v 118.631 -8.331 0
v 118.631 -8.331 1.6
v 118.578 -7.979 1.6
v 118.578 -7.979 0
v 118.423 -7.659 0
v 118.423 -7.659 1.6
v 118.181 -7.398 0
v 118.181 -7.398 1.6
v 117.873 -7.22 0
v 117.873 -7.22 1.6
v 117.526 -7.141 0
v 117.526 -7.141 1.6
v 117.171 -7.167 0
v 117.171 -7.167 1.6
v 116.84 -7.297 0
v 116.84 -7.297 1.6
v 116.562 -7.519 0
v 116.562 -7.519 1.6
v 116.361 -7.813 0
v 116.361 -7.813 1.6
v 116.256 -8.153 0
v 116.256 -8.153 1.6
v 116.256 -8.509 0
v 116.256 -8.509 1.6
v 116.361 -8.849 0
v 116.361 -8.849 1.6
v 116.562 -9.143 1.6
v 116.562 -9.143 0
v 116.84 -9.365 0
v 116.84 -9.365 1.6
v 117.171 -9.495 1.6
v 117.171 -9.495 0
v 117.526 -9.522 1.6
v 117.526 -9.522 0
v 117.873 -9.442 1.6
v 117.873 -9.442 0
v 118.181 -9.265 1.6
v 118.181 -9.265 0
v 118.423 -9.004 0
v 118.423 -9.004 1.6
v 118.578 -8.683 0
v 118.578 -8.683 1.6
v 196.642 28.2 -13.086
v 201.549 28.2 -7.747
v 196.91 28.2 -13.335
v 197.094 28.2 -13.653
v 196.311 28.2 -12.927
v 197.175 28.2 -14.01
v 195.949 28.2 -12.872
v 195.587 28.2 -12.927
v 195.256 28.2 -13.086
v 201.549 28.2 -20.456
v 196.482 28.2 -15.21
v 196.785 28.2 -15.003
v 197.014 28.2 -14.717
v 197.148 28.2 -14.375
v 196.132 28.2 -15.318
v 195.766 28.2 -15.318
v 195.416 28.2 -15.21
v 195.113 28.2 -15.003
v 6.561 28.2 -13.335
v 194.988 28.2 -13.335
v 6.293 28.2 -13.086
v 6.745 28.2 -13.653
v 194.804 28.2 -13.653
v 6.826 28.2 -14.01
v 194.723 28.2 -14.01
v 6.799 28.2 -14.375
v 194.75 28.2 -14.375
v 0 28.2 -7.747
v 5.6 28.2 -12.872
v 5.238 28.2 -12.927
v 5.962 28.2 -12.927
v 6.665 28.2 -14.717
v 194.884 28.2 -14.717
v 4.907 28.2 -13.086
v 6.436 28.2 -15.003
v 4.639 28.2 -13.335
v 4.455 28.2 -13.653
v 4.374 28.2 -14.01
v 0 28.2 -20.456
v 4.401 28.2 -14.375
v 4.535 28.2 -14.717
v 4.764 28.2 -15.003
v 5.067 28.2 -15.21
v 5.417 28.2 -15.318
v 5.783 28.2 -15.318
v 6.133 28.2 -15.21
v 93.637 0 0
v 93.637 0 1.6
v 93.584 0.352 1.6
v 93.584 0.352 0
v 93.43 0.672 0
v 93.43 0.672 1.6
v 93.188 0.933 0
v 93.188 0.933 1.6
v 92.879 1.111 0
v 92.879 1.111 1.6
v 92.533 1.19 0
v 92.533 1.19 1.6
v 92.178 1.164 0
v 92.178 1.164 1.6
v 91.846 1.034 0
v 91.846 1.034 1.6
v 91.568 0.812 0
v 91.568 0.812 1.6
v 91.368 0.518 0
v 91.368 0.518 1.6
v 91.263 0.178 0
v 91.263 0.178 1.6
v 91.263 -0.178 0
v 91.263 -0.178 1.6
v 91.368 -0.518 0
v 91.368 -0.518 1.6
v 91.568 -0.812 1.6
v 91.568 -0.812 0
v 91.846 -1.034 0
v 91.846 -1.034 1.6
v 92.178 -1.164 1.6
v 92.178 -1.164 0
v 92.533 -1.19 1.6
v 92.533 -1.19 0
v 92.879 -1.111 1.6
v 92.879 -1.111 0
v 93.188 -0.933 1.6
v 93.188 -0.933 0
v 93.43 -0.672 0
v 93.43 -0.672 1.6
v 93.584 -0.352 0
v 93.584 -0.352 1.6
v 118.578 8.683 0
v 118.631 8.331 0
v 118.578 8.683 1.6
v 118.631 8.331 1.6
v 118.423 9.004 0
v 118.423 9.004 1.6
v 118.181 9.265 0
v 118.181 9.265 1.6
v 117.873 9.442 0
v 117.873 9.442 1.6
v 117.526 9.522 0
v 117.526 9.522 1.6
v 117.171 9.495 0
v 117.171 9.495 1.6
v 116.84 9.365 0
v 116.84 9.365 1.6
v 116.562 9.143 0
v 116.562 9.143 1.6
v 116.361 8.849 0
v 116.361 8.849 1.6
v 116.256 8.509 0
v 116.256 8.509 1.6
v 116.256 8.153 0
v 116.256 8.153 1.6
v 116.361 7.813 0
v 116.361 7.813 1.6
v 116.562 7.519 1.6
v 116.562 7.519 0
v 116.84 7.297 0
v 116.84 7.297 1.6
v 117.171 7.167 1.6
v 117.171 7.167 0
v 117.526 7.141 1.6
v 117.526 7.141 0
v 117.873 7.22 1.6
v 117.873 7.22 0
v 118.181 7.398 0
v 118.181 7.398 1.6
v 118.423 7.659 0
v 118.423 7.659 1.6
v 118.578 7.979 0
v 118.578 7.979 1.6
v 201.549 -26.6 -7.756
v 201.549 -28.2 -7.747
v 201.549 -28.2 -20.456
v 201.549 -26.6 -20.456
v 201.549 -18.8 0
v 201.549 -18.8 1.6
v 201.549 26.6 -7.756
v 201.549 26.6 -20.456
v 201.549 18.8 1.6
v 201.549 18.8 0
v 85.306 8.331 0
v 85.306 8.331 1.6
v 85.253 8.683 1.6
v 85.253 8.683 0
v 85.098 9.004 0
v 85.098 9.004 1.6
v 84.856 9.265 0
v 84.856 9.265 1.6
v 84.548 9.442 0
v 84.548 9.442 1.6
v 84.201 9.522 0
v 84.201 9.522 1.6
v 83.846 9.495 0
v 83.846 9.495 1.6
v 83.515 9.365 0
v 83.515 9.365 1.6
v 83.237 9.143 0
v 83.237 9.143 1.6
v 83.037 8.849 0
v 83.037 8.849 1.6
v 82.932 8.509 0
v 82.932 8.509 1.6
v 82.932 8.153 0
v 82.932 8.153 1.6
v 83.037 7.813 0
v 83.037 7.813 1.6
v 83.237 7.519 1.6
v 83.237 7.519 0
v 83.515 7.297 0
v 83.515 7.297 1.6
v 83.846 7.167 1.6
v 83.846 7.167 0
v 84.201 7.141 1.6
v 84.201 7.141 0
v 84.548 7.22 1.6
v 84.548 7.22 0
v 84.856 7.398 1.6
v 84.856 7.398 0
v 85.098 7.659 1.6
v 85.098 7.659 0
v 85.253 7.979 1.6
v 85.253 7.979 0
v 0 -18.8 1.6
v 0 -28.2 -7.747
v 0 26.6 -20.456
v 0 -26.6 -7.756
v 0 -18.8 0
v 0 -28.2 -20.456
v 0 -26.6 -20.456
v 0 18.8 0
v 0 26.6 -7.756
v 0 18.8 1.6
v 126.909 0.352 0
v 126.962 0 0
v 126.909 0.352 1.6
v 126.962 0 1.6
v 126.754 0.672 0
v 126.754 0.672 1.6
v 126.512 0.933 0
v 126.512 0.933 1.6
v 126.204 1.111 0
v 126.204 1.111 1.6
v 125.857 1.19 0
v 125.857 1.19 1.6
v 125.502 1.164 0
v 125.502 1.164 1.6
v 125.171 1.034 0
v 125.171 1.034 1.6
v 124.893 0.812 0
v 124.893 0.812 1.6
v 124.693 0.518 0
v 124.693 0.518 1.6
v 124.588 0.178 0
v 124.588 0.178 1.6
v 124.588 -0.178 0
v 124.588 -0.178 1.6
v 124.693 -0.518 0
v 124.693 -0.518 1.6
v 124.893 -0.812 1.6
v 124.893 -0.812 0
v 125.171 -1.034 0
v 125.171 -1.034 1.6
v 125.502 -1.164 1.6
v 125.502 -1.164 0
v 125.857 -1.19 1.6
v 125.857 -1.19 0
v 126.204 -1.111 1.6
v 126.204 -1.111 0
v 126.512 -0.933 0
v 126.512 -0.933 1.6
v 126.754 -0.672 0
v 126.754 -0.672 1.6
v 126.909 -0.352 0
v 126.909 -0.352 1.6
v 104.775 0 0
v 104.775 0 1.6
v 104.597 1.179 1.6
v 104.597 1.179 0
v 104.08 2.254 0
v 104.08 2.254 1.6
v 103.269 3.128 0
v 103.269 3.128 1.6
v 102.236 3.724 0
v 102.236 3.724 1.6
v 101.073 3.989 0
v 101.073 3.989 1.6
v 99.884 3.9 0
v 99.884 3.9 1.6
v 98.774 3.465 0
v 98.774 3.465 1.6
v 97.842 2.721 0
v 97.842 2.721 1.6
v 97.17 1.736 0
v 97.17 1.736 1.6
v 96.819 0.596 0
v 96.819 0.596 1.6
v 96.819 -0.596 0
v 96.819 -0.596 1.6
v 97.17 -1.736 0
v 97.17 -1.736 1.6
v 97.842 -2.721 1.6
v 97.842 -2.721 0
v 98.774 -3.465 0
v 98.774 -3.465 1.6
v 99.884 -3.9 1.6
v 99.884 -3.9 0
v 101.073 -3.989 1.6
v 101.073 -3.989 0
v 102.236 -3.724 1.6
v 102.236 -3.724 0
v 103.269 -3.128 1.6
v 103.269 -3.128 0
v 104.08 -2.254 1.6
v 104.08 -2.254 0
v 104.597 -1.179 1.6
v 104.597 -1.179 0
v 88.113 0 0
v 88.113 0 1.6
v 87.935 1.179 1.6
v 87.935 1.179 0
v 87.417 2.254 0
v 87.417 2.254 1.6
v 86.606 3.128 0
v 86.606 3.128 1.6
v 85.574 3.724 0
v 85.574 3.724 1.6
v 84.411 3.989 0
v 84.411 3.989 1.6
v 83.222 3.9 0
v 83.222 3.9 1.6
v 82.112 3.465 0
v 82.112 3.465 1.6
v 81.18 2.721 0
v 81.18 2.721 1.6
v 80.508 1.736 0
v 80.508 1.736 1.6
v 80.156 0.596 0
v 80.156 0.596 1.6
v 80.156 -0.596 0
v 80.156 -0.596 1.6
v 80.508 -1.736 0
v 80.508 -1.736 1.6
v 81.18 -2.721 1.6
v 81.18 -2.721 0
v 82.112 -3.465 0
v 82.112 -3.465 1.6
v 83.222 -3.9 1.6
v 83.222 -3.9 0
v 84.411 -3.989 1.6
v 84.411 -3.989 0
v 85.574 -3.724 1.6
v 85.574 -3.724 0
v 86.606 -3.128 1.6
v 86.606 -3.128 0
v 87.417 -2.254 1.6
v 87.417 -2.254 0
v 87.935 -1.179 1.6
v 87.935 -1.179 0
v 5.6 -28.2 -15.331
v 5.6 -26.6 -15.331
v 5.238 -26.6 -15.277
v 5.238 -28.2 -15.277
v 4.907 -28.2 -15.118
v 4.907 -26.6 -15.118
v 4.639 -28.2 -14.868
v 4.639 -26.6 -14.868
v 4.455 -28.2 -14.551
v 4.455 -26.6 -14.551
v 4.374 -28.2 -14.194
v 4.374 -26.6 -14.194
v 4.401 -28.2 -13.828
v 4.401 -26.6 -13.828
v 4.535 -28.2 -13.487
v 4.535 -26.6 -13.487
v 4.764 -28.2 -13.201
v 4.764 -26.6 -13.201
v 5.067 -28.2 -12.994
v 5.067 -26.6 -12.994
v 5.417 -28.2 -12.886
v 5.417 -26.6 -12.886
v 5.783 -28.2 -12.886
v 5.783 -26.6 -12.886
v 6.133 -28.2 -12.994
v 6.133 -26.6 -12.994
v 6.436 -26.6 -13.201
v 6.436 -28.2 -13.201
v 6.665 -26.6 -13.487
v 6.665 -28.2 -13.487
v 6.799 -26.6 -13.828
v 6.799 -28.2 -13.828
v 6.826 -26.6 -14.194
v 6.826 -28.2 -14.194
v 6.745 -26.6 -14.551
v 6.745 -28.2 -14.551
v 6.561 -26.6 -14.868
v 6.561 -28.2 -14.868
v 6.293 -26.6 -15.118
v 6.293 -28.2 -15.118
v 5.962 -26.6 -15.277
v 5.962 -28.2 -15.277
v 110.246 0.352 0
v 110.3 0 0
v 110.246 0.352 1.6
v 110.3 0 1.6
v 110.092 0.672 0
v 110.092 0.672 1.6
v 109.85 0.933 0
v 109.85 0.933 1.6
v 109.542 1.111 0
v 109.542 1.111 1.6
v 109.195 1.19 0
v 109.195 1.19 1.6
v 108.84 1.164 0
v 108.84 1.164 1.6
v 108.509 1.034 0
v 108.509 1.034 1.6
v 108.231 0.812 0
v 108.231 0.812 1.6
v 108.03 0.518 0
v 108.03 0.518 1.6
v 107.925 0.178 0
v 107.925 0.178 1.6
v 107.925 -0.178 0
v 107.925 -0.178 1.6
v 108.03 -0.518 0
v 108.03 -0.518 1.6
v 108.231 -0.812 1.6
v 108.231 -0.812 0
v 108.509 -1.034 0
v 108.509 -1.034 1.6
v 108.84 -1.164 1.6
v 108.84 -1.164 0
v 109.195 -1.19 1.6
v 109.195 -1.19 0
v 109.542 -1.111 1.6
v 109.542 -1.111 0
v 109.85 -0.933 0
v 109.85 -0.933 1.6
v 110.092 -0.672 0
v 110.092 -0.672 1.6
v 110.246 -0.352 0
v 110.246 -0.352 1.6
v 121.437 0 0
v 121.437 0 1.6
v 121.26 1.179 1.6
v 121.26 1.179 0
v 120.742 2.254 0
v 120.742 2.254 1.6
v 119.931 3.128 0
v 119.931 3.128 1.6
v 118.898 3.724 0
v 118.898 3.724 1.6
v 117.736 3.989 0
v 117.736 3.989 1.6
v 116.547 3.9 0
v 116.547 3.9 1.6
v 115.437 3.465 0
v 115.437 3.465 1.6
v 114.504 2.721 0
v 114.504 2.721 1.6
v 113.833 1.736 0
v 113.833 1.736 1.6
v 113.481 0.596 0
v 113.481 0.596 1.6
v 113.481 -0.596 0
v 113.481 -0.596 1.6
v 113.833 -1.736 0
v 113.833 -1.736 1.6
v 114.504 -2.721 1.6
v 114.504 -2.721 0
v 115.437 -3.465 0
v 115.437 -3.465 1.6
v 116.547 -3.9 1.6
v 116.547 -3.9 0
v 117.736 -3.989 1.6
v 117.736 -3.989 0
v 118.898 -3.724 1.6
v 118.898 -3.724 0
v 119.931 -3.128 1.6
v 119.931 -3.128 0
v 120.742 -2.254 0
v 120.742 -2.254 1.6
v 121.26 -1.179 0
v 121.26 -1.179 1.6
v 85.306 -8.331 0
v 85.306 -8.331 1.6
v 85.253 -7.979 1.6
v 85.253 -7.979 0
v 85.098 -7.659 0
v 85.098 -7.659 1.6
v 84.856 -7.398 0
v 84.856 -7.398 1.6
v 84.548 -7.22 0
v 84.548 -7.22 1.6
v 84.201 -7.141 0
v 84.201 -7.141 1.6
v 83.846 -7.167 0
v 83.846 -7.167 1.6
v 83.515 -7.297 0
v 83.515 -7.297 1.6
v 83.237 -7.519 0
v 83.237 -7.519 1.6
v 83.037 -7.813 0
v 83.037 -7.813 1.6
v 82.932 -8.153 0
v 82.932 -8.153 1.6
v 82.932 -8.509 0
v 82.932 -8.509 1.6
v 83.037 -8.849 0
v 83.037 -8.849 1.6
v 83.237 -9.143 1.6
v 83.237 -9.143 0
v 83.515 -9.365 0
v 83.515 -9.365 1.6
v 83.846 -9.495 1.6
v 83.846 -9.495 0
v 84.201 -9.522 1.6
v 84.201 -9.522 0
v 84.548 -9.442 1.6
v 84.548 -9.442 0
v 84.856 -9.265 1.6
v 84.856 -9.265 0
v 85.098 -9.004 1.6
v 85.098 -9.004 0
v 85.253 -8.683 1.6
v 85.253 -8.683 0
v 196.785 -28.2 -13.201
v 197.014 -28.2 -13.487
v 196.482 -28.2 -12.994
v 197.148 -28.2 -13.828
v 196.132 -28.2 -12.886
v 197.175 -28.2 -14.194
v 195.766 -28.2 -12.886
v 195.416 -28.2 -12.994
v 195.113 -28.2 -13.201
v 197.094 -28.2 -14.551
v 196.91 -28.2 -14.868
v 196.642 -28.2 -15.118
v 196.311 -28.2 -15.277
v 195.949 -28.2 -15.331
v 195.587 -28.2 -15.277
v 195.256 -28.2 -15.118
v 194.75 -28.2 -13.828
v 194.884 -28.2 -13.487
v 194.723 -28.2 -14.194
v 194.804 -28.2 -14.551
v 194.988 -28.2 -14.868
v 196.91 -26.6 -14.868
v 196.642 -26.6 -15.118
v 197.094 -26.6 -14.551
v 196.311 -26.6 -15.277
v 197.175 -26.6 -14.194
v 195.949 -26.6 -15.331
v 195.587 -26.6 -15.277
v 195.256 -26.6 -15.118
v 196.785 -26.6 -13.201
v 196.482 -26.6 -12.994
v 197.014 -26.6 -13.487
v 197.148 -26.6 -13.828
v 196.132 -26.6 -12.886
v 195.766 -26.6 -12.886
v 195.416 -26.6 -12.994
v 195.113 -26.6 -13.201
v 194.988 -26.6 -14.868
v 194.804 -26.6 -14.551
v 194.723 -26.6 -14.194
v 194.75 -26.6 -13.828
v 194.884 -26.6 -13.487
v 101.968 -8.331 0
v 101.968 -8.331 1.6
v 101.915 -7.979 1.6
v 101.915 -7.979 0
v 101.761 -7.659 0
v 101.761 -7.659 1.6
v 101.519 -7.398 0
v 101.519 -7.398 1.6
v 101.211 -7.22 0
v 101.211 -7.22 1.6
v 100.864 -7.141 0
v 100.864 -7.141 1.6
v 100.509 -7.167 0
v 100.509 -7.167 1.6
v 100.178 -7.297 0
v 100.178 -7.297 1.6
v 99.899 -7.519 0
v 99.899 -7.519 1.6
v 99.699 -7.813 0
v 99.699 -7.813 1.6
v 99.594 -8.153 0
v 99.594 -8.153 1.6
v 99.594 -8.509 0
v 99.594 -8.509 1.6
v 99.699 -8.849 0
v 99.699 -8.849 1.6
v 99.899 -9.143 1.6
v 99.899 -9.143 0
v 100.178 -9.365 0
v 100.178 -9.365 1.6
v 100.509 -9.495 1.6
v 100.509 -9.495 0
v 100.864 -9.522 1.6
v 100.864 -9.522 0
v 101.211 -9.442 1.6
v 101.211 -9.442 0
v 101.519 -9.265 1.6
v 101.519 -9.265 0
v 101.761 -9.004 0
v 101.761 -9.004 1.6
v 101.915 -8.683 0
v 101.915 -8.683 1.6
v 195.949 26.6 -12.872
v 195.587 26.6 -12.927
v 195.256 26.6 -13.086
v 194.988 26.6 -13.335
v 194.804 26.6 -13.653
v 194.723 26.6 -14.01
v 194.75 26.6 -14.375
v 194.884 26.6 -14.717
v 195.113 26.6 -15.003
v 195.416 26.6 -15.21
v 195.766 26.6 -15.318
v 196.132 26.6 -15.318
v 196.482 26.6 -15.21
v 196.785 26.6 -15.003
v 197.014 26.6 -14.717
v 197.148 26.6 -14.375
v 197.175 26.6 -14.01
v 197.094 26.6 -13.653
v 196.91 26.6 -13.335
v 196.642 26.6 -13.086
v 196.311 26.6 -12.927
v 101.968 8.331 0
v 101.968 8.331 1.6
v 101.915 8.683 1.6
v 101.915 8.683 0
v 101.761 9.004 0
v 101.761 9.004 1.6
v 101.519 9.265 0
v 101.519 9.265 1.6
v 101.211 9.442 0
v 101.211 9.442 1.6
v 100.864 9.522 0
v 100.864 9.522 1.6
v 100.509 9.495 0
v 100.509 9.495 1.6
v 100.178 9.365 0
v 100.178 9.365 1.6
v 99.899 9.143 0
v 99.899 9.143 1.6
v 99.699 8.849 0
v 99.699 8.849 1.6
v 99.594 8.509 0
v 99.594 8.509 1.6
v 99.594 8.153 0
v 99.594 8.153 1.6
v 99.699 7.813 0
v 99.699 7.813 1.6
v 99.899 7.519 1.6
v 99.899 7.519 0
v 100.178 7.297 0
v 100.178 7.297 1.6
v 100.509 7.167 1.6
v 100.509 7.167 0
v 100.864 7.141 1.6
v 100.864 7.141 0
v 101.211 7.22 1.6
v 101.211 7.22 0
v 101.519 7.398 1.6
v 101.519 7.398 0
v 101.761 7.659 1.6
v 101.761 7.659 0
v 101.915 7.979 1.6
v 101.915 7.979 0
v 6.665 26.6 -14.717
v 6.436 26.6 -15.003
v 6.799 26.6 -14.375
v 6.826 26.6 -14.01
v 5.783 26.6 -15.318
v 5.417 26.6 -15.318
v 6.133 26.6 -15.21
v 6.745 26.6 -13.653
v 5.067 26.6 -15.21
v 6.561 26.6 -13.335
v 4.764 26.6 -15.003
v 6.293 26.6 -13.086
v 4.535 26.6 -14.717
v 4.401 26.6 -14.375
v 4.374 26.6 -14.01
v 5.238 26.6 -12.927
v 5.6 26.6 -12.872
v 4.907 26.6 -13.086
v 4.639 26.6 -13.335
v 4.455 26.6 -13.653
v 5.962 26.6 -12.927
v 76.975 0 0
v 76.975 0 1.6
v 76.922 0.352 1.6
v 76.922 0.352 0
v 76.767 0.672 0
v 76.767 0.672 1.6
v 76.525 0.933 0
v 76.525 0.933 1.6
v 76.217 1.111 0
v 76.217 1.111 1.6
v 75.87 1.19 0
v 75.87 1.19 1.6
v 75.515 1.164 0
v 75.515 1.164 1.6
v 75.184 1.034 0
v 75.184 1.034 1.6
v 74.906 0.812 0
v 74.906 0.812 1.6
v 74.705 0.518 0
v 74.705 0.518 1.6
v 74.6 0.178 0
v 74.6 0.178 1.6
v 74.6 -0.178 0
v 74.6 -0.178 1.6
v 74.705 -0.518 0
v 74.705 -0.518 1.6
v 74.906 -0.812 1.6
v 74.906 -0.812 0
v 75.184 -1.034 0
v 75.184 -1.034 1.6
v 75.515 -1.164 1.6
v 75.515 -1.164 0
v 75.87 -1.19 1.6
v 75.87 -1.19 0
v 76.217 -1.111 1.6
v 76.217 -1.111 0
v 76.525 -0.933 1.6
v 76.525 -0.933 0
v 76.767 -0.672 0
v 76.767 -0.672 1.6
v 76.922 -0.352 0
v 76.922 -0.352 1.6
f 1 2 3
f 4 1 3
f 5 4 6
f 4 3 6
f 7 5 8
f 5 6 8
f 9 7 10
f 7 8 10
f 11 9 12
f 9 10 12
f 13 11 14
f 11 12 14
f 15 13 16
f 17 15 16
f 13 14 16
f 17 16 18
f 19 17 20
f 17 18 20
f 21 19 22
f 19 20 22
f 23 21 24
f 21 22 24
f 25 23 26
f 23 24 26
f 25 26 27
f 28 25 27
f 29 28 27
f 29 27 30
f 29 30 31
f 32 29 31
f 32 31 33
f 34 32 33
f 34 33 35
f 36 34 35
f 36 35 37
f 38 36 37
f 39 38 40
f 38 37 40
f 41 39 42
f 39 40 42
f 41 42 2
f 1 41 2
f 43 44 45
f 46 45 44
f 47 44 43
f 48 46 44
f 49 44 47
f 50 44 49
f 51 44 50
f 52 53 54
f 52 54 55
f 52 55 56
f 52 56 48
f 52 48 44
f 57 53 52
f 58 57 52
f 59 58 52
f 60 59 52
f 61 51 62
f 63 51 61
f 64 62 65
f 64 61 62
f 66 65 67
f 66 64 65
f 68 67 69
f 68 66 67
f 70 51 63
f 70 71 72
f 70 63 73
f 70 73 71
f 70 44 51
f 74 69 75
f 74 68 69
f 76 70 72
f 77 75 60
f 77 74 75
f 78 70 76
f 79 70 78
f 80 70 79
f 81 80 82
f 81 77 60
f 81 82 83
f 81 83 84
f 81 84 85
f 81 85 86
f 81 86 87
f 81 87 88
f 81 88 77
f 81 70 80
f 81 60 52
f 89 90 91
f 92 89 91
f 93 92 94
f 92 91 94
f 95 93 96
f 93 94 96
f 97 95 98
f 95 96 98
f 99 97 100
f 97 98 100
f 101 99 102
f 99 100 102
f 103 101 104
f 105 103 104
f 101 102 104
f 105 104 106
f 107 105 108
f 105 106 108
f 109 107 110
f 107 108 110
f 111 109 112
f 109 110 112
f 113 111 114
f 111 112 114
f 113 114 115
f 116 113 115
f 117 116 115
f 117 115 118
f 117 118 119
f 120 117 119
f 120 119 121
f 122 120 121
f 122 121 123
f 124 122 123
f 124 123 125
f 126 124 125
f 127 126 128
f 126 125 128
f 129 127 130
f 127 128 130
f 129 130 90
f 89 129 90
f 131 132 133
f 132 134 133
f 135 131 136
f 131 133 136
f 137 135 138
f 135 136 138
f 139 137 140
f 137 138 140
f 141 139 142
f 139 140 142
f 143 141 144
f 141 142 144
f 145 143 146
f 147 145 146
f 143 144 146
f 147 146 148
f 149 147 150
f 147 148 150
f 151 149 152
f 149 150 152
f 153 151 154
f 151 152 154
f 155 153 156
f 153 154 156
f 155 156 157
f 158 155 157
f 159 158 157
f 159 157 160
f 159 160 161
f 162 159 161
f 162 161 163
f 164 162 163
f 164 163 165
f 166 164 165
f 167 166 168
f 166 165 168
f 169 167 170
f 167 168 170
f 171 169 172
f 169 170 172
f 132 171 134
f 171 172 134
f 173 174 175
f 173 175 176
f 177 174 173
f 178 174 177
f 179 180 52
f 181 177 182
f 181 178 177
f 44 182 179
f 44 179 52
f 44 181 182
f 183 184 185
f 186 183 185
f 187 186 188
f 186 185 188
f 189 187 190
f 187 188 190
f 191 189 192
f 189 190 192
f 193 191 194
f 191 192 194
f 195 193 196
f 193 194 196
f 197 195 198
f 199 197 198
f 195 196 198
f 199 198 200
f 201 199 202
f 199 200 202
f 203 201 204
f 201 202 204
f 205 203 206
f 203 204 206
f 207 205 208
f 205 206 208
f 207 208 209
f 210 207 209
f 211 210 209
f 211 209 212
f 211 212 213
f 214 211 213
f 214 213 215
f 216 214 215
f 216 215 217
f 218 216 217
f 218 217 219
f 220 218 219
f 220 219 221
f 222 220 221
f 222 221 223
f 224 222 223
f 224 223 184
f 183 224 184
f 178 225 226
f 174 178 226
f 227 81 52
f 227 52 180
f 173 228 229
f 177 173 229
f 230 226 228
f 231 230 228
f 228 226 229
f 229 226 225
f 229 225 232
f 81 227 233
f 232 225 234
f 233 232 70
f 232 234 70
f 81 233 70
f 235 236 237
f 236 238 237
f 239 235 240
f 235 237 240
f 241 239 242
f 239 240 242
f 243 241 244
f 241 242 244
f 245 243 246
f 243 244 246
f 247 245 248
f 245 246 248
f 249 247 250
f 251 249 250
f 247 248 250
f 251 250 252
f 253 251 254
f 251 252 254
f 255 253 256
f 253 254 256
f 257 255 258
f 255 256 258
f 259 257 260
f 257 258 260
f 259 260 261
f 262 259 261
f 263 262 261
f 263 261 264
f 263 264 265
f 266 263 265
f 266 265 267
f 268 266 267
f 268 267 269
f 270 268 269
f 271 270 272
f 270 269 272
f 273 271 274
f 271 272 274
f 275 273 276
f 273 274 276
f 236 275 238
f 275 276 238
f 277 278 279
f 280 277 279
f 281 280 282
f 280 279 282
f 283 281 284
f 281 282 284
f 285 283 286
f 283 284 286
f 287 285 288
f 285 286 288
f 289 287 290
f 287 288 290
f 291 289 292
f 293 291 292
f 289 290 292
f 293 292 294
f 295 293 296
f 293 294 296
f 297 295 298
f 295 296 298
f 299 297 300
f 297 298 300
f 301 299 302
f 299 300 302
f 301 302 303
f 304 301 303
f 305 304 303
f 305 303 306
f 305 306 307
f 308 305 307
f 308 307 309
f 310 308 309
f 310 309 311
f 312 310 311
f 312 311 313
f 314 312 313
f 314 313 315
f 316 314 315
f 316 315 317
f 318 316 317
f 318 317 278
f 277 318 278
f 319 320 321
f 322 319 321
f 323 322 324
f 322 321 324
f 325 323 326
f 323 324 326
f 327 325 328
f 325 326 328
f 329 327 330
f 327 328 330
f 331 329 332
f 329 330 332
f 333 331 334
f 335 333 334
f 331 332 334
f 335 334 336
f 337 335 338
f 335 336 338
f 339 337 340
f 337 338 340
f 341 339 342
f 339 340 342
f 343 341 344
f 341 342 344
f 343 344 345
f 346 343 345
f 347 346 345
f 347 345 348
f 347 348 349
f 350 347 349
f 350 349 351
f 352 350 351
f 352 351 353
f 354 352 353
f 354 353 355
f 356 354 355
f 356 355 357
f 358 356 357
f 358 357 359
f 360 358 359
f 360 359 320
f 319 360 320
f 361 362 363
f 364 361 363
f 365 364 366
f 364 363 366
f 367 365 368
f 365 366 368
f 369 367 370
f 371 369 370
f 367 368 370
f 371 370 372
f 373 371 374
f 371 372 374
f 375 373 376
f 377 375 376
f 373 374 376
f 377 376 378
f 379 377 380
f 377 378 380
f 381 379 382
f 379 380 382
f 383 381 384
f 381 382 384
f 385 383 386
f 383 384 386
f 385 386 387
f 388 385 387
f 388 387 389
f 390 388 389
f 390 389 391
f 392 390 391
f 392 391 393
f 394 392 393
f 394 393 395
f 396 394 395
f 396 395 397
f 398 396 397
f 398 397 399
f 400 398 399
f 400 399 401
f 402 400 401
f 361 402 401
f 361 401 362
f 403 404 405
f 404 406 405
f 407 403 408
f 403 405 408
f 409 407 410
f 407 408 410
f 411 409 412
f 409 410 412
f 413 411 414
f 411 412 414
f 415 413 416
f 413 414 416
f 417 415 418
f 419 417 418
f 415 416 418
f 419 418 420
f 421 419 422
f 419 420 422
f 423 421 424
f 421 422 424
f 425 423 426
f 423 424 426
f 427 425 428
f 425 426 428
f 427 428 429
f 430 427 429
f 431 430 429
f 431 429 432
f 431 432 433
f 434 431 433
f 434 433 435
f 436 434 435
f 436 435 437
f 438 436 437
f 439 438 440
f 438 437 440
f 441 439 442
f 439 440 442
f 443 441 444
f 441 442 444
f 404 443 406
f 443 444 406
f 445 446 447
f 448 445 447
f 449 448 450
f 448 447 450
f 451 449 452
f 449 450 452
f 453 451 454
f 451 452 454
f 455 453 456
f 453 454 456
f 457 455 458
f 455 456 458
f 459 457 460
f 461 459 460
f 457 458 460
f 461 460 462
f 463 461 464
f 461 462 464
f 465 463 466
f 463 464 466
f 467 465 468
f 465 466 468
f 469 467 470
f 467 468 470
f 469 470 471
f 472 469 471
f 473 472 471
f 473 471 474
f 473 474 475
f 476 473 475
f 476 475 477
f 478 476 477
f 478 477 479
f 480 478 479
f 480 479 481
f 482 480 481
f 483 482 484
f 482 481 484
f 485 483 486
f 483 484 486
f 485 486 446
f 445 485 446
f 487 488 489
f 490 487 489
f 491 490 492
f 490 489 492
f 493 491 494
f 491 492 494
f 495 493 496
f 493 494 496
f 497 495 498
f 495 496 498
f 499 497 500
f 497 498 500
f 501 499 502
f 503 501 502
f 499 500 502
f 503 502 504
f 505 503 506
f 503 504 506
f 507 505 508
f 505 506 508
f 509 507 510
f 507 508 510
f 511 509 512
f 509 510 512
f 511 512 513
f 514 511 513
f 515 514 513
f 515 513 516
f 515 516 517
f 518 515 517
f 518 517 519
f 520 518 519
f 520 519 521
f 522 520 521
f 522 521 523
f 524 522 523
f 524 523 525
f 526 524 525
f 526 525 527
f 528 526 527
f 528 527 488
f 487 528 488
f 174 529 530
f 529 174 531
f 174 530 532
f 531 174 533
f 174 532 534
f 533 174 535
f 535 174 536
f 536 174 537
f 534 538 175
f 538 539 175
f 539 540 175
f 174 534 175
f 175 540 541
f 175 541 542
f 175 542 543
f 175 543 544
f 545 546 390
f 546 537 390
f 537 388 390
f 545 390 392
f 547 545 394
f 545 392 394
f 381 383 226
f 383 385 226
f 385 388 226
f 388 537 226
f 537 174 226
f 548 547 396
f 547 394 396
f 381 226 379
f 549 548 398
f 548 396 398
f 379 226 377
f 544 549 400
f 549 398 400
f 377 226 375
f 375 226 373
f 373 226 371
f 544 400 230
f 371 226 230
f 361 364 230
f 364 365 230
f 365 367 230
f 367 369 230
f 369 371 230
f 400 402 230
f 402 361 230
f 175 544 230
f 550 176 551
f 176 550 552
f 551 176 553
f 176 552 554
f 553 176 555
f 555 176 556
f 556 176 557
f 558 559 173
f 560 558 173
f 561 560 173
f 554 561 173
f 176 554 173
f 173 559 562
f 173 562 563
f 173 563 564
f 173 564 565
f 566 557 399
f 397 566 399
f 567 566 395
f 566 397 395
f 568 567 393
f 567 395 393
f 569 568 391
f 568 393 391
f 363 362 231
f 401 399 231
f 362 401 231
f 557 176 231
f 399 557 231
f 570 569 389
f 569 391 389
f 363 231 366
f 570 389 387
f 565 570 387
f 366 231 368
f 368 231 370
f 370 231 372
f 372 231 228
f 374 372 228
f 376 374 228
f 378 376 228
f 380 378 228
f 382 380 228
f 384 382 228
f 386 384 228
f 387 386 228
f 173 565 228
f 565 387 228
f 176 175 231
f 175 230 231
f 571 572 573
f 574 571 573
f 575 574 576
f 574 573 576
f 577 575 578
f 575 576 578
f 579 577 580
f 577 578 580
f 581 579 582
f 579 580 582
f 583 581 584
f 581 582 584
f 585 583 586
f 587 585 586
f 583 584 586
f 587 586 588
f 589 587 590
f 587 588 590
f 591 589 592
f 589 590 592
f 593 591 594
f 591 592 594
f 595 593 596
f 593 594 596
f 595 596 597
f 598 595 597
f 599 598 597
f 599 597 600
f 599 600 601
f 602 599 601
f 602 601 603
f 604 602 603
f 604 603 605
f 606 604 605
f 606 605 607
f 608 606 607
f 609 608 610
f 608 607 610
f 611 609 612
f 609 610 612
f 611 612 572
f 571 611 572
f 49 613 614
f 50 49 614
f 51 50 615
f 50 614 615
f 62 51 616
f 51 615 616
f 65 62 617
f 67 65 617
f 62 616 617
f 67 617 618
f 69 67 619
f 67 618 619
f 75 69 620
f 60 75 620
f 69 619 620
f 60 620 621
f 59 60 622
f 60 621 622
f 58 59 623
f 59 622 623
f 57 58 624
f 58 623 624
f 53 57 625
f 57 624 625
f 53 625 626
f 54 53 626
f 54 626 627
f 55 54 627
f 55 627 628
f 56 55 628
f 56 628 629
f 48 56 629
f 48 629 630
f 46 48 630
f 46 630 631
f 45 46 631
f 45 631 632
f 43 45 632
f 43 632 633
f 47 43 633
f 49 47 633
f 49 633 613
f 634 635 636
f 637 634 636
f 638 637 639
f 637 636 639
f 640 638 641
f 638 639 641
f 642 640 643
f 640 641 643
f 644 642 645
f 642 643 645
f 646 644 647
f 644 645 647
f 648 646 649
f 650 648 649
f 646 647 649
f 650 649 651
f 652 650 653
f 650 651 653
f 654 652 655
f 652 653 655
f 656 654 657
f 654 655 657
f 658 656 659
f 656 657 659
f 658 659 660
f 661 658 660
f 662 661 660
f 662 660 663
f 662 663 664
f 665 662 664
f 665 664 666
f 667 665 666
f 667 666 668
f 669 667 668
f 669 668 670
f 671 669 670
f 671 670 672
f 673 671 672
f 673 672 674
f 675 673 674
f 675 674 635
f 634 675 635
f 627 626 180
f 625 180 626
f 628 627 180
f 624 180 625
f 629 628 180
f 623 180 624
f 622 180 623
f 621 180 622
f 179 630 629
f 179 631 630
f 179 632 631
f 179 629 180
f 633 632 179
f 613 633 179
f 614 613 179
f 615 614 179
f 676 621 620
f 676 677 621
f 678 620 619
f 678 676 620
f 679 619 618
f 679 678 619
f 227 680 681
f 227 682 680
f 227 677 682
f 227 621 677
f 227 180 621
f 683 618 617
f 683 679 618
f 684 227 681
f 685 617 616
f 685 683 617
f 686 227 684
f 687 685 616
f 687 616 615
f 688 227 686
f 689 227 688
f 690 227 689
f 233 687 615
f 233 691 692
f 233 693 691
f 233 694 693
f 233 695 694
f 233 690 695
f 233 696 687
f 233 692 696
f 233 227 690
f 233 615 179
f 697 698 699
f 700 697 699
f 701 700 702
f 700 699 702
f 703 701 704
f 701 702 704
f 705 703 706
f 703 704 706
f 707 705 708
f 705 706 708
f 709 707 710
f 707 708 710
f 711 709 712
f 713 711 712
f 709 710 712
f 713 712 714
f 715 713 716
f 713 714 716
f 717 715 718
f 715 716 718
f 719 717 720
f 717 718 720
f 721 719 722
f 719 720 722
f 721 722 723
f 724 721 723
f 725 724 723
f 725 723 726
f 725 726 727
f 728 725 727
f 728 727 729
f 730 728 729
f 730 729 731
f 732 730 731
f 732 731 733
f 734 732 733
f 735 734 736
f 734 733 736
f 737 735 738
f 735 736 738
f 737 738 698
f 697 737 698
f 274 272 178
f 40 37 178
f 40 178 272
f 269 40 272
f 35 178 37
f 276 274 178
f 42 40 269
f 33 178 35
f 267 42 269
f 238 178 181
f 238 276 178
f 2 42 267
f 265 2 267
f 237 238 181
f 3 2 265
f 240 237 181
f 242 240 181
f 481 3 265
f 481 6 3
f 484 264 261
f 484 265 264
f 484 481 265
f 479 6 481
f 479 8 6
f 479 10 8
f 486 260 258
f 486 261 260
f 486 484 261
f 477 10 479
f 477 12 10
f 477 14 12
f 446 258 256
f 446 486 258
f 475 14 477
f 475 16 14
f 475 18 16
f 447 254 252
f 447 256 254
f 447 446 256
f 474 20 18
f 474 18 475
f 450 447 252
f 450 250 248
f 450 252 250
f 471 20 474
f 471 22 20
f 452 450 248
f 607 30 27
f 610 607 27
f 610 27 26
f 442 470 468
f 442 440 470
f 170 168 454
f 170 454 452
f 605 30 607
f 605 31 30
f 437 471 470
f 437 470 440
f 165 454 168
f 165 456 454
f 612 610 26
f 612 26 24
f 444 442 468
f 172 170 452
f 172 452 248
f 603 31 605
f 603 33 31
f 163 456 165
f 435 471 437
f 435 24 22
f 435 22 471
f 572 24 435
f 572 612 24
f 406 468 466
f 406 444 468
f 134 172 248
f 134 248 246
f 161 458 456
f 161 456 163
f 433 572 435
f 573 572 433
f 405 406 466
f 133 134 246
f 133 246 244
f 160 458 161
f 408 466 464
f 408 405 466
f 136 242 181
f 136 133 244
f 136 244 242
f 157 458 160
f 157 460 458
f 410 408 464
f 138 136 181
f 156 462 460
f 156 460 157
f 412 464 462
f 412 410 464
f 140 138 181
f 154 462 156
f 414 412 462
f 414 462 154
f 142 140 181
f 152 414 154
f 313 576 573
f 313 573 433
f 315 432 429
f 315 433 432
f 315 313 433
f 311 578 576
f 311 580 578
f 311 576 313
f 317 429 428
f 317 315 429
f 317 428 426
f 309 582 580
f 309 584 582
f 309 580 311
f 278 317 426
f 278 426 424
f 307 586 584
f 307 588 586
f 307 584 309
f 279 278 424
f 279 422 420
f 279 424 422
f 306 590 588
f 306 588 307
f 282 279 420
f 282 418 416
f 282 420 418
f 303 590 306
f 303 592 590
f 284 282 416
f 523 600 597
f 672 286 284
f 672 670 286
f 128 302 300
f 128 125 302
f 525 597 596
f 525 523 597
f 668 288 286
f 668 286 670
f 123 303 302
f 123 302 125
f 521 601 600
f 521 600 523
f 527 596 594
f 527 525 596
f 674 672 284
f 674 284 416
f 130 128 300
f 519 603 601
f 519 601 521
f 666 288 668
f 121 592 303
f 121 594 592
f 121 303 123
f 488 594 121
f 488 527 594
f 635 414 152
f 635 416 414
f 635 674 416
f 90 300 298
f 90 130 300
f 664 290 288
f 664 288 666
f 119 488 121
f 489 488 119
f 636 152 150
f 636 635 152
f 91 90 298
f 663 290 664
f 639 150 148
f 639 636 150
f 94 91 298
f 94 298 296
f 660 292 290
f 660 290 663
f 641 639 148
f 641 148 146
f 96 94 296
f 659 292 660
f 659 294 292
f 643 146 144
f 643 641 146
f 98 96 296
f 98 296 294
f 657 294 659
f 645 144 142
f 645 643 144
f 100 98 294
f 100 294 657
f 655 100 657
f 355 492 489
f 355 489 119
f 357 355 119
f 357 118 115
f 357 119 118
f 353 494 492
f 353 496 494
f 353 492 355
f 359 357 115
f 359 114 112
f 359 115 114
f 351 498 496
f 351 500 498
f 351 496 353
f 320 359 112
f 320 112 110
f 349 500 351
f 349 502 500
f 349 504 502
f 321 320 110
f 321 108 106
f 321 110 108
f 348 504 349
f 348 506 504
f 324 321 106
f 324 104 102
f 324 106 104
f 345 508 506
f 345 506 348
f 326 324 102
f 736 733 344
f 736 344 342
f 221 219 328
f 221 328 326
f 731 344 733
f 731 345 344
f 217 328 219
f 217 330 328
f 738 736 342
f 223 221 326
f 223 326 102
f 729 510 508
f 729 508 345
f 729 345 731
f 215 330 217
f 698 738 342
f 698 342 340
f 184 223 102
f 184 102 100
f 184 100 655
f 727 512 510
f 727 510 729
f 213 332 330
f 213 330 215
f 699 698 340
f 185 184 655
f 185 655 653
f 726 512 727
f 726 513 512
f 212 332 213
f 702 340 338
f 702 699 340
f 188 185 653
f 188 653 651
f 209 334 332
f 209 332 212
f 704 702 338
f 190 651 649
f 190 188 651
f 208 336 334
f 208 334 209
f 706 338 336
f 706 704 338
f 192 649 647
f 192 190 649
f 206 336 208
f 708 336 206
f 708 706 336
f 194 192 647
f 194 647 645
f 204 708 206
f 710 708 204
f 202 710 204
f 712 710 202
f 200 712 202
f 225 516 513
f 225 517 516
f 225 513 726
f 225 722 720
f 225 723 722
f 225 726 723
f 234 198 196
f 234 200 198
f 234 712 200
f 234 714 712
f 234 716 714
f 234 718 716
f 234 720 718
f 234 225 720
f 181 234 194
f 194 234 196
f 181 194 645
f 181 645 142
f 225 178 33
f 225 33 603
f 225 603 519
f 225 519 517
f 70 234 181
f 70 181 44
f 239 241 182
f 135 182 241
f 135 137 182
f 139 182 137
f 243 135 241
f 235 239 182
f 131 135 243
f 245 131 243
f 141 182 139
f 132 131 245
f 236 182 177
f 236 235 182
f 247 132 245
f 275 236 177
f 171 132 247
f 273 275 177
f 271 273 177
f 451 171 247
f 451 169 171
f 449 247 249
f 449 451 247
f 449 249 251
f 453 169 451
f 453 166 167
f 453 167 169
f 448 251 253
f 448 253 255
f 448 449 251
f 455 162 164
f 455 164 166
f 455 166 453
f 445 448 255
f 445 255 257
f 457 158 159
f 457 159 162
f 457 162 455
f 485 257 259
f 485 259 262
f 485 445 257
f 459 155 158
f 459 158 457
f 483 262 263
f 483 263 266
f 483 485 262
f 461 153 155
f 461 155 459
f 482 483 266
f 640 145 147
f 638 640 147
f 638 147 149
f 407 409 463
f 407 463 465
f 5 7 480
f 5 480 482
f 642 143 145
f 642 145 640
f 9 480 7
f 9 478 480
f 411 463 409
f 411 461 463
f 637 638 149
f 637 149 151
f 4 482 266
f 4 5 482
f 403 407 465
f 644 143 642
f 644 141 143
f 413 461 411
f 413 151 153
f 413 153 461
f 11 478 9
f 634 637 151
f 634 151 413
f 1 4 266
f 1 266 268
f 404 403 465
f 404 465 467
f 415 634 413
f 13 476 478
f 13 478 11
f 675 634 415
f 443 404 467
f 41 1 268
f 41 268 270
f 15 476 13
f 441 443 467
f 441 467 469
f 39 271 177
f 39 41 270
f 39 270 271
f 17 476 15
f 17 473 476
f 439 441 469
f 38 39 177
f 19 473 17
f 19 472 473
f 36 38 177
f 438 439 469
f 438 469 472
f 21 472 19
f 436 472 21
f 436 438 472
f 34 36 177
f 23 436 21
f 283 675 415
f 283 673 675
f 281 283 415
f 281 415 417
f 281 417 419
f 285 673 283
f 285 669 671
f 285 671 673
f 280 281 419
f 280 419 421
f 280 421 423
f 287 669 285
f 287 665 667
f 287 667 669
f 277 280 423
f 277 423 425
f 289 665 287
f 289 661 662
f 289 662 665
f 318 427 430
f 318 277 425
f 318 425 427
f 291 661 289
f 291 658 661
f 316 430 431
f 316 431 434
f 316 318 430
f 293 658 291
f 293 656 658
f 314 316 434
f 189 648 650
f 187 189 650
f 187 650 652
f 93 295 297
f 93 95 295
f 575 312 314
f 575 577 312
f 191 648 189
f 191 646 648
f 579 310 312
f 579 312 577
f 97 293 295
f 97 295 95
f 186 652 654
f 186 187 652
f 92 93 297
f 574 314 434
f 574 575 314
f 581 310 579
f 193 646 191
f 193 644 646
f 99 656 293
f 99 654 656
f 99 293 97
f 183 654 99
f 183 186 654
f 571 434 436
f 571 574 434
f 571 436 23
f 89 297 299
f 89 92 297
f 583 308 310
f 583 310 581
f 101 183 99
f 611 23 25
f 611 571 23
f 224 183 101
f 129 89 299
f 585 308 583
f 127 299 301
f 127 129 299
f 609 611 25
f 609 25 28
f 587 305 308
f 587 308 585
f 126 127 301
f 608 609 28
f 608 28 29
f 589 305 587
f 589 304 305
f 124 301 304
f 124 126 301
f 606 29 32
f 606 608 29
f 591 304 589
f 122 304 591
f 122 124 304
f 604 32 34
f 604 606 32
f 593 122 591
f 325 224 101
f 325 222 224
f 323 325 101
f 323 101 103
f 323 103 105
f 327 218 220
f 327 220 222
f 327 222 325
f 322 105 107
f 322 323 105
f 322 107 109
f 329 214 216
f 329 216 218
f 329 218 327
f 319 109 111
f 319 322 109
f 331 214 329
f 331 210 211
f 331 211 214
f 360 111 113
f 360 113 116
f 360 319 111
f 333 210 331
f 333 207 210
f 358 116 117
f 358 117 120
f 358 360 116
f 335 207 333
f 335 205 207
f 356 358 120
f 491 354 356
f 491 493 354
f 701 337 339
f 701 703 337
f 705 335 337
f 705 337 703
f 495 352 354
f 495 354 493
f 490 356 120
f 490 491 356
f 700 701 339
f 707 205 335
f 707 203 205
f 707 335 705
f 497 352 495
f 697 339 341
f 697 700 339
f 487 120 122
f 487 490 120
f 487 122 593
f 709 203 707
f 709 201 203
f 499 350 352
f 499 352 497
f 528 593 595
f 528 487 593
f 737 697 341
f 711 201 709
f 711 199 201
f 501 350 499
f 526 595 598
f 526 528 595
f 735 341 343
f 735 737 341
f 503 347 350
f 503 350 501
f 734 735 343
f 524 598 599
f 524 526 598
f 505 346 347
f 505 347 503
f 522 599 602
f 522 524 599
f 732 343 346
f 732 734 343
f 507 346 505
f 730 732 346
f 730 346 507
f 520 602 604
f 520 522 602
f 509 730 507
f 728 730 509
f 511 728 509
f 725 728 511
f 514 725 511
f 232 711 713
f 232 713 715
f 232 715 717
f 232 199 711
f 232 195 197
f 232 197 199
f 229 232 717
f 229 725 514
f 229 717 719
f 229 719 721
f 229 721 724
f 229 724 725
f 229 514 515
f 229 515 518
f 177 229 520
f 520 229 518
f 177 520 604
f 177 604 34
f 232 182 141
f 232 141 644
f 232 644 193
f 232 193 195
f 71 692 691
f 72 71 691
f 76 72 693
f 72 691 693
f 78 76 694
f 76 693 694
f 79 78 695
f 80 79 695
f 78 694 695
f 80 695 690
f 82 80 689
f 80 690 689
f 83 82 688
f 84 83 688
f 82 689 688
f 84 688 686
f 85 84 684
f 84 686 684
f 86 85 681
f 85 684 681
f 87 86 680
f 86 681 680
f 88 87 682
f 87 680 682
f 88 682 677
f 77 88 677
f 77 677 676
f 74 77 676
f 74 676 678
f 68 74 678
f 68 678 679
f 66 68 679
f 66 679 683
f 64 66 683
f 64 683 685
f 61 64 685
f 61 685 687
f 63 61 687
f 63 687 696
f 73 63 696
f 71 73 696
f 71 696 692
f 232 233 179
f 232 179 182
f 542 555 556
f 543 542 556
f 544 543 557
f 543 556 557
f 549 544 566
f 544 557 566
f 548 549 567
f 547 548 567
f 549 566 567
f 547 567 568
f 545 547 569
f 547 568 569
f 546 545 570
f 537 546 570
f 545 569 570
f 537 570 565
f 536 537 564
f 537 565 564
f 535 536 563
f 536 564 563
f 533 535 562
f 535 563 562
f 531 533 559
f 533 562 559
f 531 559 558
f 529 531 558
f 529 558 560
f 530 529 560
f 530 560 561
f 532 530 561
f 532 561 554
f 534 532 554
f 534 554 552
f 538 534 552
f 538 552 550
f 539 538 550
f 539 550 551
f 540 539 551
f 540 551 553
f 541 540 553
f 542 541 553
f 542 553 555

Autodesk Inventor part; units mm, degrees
ref_plane "YZ Plane" through (0, 0, 0) normal (1, 0, 0) x (0, 1, 0)
ref_plane "XZ Plane" through (0, 0, 0) normal (0, 1, 0) x (-1, 0, 0)
ref_plane "XY Plane" through (0, 0, 0) normal (0, 0, 1) x (1, 0, 0)
sketch "Sketch1" plane through (0, 0, 0) normal (1, 0, 0) x (0, 1, 0)
  line L0 (18.8, 0) -> (-18.8, 0)
  line L1 (-18.8, 0) -> (-18.8, 1.6)
  line L2 (-18.8, 1.6) -> (18.8, 1.6)
  line L3 (18.8, 1.6) -> (18.8, 0)
  line L4 (18.8, 1.6) -> (28.2, -7.7473)
  line L5 (28.2, -7.7473) -> (28.2, -20.4563)
  line L6 (28.2, -20.4563) -> (26.6, -20.4563)
  line L7 (26.6, -20.4563) -> (26.6, -7.7563)
  line L8 (26.6, -7.7563) -> (18.8, 0)
  line L9 (0, 0) -> (0, 1.6)
  line L10 (-18.8, 1.6) -> (-28.2, -7.7473)
  line L11 (-28.2, -7.7473) -> (-28.2, -20.4563)
  line L12 (-26.6, -20.4563) -> (-26.6, -7.7563)
  line L13 (-26.6, -7.7563) -> (-18.8, 0)
  line L14 (-28.2, -20.4563) -> (-26.6, -20.4563)
  dimension "d0" = 1.6
  dimension "d1" = 1.6
  dimension "d3" = 11
  dimension "d4" = 12.7
  dimension "d5" = 56.4
  dimension "d8" = 7.8
extrude "Extrusion1" add sketch "Sketch1" along normal blind 201.549
sketch "Sketch2" plane through (0, 28.2, -7.7473) normal (0, 1, 0) x (1, 0, 0)
  line L0 (0, 12.709) -> (0, 0) projected
  line L1 (0, 0) -> (201.549, 0) projected
  line L2 (201.549, 12.709) -> (201.549, 0) projected
  line L3 (0, 12.709) -> (201.549, 12.709) projected
  point P0 (0, -7.7473)
  point P1 (5.6, 6.3545)
  point P2 (195.949, 6.3545)
  point P3 (0, 6.3545)
  point P4 (201.549, 6.3545)
  dimension "d11" = 5.6
  dimension "d12" = 5.6
hole "Hole1" at (5.6, 28.2, -14.1018) at (195.949, 28.2, -14.1018) direction (0, -1, 0) diameter 2.459 end up to surface
sketch "Sketch3" plane through (0, -28.2, -20.4563) normal (0, -1, 0) x (1, 0, 0)
  circle A0 centre (195.949, 6.3545) radius 1.2295 projected
  circle A1 centre (5.6, 6.3545) radius 1.2295 projected
  point P0 (0, 20.4563)
hole "Hole2" at (195.949, -28.2, -14.1018) at (5.6, -28.2, -14.1018) direction (0, 1, 0) diameter 2.459 end up to surface
sketch "Sketch4" plane through (0, -18.8, 1.6) normal (0, 0, 1) x (1, 0, 0)
  line L0 (0, 37.6) -> (0, 0) projected
  line L1 (0, 0) -> (201.549, 0) projected
  line L2 (201.549, 37.6) -> (201.549, 0) projected
  line L3 (0, 37.6) -> (201.549, 37.6) construction
  circle A0 centre (100.7745, 18.8) radius 4.0005
  circle A1 centre (100.7745, 27.1312) radius 1.1938
  circle A2 centre (92.4433, 18.8) radius 1.1938
  circle A3 centre (100.7745, 10.4688) radius 1.1938
  circle A4 centre (109.1057, 18.8) radius 1.1938
  line L4 (0, 37.6) -> (201.549, 37.6) projected
  circle A5 centre (84.1121, 18.8) radius 4.0005
  circle A6 centre (84.1121, 27.1312) radius 1.1938
  circle A7 centre (75.7809, 18.8) radius 1.1938
  circle A8 centre (84.1121, 10.4688) radius 1.1938
  circle A9 centre (92.4433, 18.8) radius 1.1938
  circle A10 centre (117.4369, 18.8) radius 4.0005
  circle A11 centre (117.4369, 27.1312) radius 1.1938
  circle A12 centre (109.1057, 18.8) radius 1.1938
  circle A13 centre (117.4369, 10.4688) radius 1.1938
  circle A14 centre (125.7681, 18.8) radius 1.1938
  point P0 (0, 18.8)
  point P1 (100.7745, 37.6)
  point P2 (201.549, 18.8)
  point P3 (100.7745, 37.6)
  dimension "d27" = 8.001
  dimension "d28" = 8.3312
  dimension "d29" = 2.3876
  dimension "d32" = 360
  dimension "d39" = 8.001
  dimension "d40" = 8.3312
  dimension "d41" = 2.3876
  dimension "d42" = 360
  dimension "d47" = 8.001
  dimension "d48" = 8.3312
  dimension "d49" = 2.3876
  dimension "d50" = 360
  dimension "d53" = 16.6624
  dimension "d54" = 16.6624
extrude "Extrusion2" cut sketch "Sketch4" against normal through all contours A0 | A1 | A2 | A3 | A4 | A5 | A6 | A7 | A8 | A10 | A11 | A13 | A14
equation "\"d12\" = d11"
equation "\"d54\" = d53"
properties part number "ChassisMainBracket"
